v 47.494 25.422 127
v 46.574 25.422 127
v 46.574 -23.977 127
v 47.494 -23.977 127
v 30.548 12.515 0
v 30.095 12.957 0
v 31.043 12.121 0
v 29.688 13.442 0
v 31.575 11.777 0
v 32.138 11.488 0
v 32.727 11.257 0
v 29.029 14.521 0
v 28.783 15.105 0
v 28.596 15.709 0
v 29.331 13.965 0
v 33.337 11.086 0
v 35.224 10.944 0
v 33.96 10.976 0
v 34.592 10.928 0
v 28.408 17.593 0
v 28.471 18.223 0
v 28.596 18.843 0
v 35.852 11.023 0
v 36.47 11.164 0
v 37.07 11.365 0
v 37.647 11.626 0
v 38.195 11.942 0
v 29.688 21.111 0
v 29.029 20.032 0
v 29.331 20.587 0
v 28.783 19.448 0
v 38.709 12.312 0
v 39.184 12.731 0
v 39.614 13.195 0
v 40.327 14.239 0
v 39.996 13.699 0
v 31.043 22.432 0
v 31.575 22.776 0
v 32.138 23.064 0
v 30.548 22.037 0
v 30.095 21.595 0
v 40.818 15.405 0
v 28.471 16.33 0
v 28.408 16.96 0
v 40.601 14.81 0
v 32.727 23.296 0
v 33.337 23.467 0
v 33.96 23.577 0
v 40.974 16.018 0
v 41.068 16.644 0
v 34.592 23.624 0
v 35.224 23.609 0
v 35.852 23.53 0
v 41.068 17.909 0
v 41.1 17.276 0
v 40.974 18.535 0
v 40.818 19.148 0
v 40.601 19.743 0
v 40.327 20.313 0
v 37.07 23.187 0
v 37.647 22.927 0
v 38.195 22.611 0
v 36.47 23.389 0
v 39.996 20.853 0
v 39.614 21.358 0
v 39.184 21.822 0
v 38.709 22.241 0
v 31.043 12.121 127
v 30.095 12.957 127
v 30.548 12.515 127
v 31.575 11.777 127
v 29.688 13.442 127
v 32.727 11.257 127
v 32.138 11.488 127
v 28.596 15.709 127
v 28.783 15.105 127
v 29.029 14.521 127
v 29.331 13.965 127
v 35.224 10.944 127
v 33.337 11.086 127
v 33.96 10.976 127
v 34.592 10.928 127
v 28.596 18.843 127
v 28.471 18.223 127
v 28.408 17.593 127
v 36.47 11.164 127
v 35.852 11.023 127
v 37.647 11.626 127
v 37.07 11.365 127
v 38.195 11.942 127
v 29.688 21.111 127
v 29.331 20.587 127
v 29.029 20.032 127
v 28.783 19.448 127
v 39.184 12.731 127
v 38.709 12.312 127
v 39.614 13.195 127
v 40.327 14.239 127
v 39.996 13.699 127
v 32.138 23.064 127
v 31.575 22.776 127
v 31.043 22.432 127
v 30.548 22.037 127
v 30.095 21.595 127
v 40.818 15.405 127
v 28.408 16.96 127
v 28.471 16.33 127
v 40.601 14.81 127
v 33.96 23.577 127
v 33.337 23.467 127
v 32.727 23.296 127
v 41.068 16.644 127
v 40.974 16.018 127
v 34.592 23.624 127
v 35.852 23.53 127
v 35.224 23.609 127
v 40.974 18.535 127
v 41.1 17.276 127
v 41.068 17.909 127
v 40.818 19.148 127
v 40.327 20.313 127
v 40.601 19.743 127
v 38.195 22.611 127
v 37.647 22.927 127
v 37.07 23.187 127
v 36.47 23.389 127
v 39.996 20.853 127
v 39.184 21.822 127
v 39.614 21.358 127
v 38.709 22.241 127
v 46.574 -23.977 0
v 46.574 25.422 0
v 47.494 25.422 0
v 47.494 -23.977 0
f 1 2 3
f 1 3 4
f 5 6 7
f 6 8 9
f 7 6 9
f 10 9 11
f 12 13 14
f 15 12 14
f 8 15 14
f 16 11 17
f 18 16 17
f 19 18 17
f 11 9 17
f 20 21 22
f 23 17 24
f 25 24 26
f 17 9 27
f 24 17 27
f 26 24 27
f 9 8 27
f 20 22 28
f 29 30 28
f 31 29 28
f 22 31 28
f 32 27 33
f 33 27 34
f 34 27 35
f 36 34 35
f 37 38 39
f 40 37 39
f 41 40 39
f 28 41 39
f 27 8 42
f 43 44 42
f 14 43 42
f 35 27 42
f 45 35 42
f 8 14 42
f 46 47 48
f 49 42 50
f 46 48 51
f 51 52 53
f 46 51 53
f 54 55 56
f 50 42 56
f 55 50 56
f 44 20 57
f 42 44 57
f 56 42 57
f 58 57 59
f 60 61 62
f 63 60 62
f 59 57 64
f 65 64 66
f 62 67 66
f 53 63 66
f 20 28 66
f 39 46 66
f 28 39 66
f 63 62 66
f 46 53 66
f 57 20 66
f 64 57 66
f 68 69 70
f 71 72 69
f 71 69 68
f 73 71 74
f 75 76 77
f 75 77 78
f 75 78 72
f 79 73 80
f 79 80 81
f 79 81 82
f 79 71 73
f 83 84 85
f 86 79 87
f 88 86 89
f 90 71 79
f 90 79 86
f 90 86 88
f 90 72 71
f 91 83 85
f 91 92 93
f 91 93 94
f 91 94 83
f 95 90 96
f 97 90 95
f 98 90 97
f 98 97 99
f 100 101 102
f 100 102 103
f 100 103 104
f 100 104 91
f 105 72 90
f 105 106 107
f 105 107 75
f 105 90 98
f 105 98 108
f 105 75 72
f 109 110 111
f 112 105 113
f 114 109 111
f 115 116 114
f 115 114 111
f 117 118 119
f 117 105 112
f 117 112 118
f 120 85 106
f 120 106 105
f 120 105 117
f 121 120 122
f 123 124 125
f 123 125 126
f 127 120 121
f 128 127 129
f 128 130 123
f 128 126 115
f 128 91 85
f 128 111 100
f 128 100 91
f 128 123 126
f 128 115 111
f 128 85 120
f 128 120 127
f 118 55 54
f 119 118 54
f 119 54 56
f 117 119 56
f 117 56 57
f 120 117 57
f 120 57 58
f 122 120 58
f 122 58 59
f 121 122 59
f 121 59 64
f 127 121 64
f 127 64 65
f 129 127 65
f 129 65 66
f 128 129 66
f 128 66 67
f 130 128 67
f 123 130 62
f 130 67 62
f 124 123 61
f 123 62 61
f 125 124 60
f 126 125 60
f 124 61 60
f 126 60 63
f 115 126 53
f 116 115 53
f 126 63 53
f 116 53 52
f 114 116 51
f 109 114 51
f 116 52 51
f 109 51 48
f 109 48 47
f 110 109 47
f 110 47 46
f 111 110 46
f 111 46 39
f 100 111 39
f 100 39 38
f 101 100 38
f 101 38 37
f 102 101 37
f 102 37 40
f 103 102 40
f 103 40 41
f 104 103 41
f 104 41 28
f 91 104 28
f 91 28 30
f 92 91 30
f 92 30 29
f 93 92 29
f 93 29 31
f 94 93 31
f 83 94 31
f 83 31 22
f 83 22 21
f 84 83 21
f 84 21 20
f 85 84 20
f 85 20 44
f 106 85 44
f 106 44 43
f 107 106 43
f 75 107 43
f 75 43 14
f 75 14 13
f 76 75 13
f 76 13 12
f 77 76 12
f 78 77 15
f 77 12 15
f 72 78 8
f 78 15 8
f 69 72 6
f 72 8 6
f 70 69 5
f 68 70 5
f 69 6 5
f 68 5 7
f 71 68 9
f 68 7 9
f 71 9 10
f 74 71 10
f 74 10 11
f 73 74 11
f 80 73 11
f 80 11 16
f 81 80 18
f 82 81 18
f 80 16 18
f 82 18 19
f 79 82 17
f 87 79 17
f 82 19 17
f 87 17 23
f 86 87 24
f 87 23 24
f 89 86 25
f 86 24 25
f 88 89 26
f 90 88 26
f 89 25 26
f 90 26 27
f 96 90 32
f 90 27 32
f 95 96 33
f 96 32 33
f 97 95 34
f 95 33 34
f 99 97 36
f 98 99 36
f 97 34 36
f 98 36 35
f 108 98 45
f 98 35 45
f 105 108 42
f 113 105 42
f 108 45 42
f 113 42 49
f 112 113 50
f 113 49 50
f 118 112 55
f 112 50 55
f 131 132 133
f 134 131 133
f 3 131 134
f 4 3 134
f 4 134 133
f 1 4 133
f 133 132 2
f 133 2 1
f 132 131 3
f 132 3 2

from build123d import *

# Parameters (mm, degrees)
F0_W     = 94.067589
F0_H     = 49.398624
F1_DEPTH = 127
F3_D     = 12.7


with BuildPart() as f1:
    # F0 (on Top) → F1 (new body)
    with BuildSketch(Plane.XY):
        with Locations((0.459827, 0.722587)):
            Rectangle(F0_W, F0_H)
    extrude(amount=F1_DEPTH)

    # F3 (through all)
    with Locations(Plane.XY.offset(127)):
        with Locations((-34.749828, 17.27638)):
            Hole(F3_D / 2)

    # F4: F1 across plane


with BuildPart() as f1_1:
    add(f1.part)
    add(f1.part.mirror(Plane.YZ), mode=Mode.SUBTRACT)


solid = f1_1.part
